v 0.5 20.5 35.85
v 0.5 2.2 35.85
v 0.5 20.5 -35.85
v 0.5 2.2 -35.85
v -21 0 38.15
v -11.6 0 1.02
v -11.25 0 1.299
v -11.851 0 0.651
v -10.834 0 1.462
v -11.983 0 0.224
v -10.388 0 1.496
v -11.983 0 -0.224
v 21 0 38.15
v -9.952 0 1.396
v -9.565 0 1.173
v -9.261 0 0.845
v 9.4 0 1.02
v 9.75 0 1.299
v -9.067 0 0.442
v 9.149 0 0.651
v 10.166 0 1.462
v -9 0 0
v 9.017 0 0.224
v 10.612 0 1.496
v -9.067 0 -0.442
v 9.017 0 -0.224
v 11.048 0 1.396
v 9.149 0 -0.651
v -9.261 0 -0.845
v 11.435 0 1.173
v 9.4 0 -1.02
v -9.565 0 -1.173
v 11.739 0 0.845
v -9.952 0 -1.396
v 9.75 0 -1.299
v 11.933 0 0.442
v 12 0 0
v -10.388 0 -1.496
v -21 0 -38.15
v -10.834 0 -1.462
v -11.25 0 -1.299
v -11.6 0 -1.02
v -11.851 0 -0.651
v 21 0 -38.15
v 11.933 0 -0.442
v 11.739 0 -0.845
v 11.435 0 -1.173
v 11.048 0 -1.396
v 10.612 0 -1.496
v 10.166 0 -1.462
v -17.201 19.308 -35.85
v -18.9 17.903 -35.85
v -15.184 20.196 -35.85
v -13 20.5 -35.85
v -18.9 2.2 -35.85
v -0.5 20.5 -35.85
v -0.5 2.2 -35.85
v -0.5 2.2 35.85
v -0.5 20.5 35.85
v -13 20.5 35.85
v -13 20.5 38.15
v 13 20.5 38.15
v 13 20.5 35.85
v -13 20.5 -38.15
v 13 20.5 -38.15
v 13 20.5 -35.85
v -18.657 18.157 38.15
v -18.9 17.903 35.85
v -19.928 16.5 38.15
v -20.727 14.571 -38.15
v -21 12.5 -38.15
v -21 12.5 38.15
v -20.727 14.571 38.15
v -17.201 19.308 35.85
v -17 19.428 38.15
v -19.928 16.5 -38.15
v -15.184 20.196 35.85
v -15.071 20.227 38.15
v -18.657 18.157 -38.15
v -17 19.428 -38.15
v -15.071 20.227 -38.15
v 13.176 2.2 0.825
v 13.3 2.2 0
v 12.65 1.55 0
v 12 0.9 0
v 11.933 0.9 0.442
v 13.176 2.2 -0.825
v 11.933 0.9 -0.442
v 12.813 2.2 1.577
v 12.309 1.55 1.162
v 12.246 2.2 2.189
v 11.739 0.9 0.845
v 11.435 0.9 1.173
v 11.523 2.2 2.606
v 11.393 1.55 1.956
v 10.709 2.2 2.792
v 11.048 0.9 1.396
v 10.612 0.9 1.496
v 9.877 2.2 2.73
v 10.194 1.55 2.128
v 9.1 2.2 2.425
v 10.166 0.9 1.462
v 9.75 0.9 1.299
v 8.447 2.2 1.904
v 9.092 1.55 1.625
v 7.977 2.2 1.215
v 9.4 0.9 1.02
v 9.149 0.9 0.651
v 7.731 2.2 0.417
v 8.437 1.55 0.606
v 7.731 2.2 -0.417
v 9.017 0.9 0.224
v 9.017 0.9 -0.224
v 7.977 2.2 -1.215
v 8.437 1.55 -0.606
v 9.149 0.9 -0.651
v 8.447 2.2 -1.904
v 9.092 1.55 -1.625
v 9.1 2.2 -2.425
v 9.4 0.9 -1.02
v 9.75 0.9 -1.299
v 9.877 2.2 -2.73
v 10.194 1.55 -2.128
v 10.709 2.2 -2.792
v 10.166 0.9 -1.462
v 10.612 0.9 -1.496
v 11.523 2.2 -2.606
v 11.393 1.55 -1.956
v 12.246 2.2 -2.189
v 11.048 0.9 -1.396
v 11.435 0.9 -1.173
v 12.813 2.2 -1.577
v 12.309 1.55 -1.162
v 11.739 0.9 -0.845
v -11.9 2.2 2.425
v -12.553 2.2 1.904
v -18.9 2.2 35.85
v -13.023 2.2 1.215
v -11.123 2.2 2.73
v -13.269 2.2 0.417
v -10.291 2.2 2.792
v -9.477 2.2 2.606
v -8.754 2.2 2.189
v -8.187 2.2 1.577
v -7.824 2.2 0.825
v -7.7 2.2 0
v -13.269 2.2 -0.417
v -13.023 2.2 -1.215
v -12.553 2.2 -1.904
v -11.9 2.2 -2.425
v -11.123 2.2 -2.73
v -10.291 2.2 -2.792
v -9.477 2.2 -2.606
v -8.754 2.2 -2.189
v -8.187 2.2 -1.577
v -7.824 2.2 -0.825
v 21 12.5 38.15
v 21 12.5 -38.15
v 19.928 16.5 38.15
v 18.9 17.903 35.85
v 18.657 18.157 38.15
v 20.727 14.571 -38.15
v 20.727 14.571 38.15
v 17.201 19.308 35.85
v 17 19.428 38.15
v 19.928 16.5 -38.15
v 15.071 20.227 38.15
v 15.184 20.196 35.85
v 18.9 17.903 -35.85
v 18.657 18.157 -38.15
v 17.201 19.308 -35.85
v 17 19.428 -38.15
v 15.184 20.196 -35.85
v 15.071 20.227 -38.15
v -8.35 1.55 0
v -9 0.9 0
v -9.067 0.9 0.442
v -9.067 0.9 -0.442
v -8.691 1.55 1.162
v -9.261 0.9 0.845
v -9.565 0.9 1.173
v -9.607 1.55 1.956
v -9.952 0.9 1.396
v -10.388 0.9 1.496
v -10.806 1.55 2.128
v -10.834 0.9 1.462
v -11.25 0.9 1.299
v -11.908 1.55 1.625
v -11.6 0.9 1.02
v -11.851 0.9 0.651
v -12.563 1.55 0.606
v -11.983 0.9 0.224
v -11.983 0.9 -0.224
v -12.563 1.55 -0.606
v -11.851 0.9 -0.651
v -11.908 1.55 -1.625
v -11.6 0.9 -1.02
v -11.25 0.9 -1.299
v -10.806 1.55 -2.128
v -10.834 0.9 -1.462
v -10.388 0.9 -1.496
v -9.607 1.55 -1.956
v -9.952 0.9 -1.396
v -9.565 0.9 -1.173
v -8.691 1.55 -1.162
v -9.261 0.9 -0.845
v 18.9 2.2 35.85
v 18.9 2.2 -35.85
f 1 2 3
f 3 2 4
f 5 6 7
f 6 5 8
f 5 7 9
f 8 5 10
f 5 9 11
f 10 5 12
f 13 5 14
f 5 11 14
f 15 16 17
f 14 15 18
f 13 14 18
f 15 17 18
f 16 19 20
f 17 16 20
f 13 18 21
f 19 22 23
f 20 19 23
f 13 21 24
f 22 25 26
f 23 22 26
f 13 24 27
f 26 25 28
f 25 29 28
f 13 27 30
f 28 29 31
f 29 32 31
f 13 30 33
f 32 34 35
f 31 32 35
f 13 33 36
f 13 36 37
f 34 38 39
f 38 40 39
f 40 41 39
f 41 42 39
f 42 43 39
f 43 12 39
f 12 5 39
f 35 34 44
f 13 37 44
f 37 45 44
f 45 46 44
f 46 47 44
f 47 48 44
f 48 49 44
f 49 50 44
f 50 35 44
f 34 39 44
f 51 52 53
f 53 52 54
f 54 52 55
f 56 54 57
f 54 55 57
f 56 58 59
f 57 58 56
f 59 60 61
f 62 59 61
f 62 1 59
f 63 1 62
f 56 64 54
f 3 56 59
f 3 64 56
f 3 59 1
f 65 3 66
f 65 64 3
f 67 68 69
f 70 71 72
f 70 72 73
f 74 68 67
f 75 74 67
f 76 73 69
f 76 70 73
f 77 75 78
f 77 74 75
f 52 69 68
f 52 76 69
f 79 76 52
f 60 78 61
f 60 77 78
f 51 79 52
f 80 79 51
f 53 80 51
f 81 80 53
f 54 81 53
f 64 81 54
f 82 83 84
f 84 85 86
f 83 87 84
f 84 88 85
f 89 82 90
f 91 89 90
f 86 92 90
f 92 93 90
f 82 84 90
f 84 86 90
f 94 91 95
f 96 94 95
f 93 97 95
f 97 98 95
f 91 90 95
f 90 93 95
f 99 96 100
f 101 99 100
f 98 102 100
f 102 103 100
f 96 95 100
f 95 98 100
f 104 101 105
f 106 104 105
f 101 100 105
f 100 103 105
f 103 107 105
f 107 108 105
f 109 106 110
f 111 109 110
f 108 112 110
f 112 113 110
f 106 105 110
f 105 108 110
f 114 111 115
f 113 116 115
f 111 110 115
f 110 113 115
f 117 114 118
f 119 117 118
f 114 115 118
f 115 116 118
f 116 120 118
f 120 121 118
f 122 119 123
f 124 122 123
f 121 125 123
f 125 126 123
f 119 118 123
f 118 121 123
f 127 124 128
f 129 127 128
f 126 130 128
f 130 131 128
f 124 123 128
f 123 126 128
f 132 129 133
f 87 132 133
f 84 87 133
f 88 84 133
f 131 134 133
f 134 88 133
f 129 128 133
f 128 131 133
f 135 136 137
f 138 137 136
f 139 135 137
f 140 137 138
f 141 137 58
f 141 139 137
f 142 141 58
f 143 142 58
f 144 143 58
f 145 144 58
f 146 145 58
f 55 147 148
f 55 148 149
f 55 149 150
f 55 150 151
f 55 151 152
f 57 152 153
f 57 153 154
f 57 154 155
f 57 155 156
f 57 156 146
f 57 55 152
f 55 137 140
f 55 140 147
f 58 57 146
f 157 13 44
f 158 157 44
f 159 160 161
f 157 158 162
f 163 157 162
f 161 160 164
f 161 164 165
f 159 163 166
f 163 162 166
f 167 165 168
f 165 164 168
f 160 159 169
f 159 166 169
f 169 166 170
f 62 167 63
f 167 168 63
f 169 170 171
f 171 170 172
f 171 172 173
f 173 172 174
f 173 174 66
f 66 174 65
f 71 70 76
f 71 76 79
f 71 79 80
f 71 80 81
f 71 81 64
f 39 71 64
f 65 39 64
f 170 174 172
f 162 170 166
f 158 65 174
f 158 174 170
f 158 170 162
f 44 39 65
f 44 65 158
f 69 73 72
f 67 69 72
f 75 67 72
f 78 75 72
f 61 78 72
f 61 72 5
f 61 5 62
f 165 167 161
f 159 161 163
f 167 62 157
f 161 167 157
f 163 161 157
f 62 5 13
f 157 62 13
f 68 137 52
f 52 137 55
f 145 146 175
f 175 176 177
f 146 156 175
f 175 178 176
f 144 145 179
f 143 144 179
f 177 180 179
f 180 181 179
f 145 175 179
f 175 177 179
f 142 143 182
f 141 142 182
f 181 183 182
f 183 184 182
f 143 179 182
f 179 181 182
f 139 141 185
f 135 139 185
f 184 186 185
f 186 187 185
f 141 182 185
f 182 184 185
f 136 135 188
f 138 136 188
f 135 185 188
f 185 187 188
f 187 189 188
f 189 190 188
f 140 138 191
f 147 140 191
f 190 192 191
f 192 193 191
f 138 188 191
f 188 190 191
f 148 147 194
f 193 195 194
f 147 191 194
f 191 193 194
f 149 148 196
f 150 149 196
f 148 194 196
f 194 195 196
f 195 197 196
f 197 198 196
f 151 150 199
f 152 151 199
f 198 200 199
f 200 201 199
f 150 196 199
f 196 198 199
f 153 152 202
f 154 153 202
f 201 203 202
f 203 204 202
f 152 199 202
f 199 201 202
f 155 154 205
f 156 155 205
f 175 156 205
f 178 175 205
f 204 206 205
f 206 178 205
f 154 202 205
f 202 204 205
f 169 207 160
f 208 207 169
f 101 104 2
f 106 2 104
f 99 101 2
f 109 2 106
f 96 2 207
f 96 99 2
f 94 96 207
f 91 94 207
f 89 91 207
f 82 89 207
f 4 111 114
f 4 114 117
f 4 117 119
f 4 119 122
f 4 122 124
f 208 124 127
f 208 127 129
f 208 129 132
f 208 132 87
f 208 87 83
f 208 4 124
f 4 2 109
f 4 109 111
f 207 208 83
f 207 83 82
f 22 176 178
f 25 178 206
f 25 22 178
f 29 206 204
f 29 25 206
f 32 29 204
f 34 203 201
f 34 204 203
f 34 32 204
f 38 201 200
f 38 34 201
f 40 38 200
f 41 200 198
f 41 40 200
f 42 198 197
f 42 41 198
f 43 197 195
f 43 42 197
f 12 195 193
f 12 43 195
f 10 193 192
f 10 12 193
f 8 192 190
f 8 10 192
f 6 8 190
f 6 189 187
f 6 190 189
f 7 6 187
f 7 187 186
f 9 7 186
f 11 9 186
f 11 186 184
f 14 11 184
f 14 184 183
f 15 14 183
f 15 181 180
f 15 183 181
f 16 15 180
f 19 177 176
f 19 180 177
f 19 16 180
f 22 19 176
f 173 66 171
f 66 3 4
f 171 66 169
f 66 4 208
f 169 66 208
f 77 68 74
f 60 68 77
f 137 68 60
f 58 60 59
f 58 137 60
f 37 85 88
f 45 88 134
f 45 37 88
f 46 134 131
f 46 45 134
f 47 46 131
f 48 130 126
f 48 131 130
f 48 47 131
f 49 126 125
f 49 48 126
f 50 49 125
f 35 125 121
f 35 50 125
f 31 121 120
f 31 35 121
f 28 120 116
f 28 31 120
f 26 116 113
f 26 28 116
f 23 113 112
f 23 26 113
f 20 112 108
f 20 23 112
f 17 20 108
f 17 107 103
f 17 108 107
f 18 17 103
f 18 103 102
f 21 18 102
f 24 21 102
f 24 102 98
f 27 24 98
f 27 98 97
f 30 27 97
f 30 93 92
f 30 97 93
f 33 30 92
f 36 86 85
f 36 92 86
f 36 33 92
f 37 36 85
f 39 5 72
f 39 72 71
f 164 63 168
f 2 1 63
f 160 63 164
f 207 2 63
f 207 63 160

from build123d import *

# Parameters (mm, degrees)
SKETCH_1_W          = 42
SKETCH_1_H          = 76.3
EXTRUDE_1_DEPTH     = 20.5
FILLET_1_R          = 8
SHELL_1_T           = 2.3
CUT_EXTRUDE_START   = 2.2
SKETCH_3_W          = 37.8
SKETCH_3_H          = 71.7
CUT_EXTRUDE_1_DEPTH = 19.3
SKETCH_1_3_R        = 1.5
CUT_EXTRUDE_2_DEPTH = 21.5
SKETCH_4_W          = 1
SKETCH_4_H          = 76.3
EXTRUDE_2_DEPTH     = 20.5
CHAMFER1_SIZE       = 1.3


with BuildPart() as part:
    # Эскиз1 → Бобышка-Вытянуть1 (new body)
    with BuildSketch(Plane(origin=(0, 0, 0), x_dir=(1, 0, 0), z_dir=(0, 1, 0))):
        Rectangle(SKETCH_1_W, SKETCH_1_H)
    extrude(amount=EXTRUDE_1_DEPTH)

    # Скругление1
    fillet_1_edges = [part.edges().sort_by_distance(p)[0] for p in [
        (-21, 20.5, 0),
        (21, 20.5, 0),
    ]]
    fillet(fillet_1_edges, radius=FILLET_1_R)

    # Оболочка1 (no face opened: a closed hollow body)
    add(offset(amount=-SHELL_1_T, mode=Mode.PRIVATE), mode=Mode.SUBTRACT)

    # Эскиз3 → Вырез-Вытянуть1 (cut, through all)
    with BuildSketch(Plane(origin=(0, 0, 0), x_dir=(1, 0, 0), z_dir=(0, 1, 0)).offset(CUT_EXTRUDE_START)):
        Rectangle(SKETCH_3_W, SKETCH_3_H)
    extrude(amount=CUT_EXTRUDE_1_DEPTH, mode=Mode.SUBTRACT)

    # Эскиз1<3> → Вырез-Вытянуть2 (cut, through all)
    with BuildSketch(Plane(origin=(0, 0, 0), x_dir=(1, 0, 0), z_dir=(0, 1, 0))):
        with Locations((-10.5, 0)):
            Circle(SKETCH_1_3_R)
        with Locations((10.5, 0)):
            Circle(SKETCH_1_3_R)
    extrude(amount=CUT_EXTRUDE_2_DEPTH, mode=Mode.SUBTRACT)

    # Эскиз4 → Бобышка-Вытянуть2 (add)
    with BuildSketch(Plane(origin=(0, 0, 0), x_dir=(1, 0, 0), z_dir=(0, 1, 0))):
        Rectangle(SKETCH_4_W, SKETCH_4_H)
    extrude(amount=EXTRUDE_2_DEPTH)

    # Chamfer1
    chamfer1_edges = [part.edges().sort_by_distance(p)[0] for p in [
        (9, 2.2, 0),
        (-12, 2.2, 0),
    ]]
    chamfer(chamfer1_edges, length=CHAMFER1_SIZE)


solid = part.part
